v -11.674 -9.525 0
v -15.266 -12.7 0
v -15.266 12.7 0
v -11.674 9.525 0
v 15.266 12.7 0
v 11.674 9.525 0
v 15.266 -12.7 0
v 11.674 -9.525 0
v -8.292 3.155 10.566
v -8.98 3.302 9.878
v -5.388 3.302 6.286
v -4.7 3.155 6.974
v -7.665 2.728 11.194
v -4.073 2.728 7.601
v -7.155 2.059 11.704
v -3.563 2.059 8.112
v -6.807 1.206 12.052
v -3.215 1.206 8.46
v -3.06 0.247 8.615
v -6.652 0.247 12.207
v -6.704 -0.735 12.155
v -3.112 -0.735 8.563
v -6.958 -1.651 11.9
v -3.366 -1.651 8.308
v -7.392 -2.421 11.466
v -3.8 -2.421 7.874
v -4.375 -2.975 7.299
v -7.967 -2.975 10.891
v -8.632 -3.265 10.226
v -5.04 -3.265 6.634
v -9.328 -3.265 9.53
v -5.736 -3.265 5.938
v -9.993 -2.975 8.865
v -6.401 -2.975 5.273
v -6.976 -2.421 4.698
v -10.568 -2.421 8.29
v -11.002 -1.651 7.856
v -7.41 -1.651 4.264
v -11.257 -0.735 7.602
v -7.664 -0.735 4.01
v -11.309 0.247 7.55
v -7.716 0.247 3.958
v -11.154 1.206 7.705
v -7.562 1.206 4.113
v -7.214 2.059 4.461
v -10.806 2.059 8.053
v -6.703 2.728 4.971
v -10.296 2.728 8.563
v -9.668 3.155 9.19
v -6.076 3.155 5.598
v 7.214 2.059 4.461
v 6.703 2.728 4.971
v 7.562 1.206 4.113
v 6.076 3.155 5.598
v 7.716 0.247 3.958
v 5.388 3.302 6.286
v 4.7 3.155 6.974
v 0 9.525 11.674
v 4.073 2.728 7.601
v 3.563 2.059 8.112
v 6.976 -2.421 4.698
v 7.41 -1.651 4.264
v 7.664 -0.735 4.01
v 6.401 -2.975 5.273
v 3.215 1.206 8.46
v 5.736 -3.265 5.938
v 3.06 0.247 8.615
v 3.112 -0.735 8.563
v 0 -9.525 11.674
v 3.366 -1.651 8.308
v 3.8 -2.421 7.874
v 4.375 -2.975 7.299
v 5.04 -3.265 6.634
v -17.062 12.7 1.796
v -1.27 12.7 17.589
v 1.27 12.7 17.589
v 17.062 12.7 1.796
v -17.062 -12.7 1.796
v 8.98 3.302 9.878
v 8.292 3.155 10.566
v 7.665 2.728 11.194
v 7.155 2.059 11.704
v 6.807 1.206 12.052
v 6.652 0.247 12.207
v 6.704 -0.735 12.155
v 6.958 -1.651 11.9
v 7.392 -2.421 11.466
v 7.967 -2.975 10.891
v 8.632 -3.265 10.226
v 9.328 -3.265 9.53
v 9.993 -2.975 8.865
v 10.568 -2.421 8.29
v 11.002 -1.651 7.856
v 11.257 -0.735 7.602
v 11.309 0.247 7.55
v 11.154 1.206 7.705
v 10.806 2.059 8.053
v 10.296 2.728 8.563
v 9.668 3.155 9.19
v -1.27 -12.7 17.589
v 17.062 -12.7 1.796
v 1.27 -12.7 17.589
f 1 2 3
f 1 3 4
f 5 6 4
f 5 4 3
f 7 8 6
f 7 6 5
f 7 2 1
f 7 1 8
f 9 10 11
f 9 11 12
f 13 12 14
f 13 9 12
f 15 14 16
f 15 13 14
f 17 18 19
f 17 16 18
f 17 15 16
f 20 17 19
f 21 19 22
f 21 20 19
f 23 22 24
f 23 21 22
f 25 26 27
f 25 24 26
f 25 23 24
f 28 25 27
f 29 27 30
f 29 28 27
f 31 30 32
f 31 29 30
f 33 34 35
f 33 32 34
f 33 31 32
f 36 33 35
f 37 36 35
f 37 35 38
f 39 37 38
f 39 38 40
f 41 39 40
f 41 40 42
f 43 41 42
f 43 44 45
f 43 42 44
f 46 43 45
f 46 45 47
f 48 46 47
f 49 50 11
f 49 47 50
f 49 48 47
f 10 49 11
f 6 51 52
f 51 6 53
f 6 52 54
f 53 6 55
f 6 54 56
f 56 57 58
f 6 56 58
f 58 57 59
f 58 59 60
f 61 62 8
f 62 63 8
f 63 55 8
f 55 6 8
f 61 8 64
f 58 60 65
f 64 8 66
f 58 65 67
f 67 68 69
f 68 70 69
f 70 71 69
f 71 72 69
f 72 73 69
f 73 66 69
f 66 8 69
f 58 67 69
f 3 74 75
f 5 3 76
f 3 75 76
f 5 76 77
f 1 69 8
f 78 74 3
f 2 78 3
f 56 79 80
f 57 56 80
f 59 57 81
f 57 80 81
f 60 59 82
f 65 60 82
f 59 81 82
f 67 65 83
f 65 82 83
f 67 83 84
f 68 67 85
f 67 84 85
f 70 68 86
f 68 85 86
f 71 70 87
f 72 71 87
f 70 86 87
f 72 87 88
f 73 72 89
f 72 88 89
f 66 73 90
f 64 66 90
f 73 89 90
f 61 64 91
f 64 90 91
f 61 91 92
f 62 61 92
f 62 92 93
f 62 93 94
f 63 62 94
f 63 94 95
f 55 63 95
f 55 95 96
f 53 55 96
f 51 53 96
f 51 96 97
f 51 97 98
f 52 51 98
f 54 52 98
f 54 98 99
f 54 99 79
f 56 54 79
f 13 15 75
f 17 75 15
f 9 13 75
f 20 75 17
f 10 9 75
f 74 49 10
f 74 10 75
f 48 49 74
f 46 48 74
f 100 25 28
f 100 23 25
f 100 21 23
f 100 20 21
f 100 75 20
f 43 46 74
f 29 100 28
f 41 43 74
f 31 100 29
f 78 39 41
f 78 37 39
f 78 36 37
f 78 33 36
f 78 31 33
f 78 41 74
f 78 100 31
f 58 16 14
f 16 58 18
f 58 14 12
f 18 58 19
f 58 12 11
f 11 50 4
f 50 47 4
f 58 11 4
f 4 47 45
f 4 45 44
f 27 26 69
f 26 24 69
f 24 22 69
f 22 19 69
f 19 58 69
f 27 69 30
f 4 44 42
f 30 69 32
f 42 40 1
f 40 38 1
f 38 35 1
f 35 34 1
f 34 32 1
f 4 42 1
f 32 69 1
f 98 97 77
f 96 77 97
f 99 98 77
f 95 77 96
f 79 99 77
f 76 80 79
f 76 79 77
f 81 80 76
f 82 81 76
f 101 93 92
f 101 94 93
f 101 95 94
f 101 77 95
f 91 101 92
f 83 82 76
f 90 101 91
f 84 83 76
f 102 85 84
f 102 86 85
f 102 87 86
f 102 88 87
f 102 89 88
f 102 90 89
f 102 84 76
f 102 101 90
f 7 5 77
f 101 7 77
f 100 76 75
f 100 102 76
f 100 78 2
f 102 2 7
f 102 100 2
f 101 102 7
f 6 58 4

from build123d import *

# Parameters (mm, degrees)
F1_DEPTH = 12.7
F3_DEPTH = 9.525
F5_D     = 6.604


# Not quite as in the source:
# - a pattern or mirror of a feature is missing from the dataset's text; its kind, count and spacing are read off the source's solid


with BuildPart() as f1:
    # F0 (on Front) → F1 (new body, symmetric)
    with BuildSketch(Plane.XZ):
        Polygon((-17.06248663, 1.7960512242), (-15.2664354058, 0), (15.2664354058, 0), (17.06248663, 1.7960512242), (1.27, 17.5885378542), (-1.27, 17.5885378542), align=None)
    extrude(amount=F1_DEPTH, both=True)

    # F2 (on Front) → F3 (cut, symmetric)
    with BuildSketch(Plane.XZ):
        Polygon((0, 11.6743329574), (-11.6743329574, 0), (11.6743329574, 0), align=None)
    extrude(amount=F3_DEPTH, both=True, mode=Mode.SUBTRACT)

    # F5 (through all)
    with Locations(Plane(origin=(5.8371664787, 0, 5.8371664787), x_dir=(0, -1, 0), z_dir=(-0.7071067812, 0, -0.7071067812))):
        with Locations((0, 0.635)):
            f5 = Hole(F5_D / 2)

    # F5_copies: F5 across plane
    add(f5.mirror(Plane(origin=(0, 0, 0), x_dir=(0, 0, -1), z_dir=(-1, 0, 0))), mode=Mode.SUBTRACT)


solid = f1.part
